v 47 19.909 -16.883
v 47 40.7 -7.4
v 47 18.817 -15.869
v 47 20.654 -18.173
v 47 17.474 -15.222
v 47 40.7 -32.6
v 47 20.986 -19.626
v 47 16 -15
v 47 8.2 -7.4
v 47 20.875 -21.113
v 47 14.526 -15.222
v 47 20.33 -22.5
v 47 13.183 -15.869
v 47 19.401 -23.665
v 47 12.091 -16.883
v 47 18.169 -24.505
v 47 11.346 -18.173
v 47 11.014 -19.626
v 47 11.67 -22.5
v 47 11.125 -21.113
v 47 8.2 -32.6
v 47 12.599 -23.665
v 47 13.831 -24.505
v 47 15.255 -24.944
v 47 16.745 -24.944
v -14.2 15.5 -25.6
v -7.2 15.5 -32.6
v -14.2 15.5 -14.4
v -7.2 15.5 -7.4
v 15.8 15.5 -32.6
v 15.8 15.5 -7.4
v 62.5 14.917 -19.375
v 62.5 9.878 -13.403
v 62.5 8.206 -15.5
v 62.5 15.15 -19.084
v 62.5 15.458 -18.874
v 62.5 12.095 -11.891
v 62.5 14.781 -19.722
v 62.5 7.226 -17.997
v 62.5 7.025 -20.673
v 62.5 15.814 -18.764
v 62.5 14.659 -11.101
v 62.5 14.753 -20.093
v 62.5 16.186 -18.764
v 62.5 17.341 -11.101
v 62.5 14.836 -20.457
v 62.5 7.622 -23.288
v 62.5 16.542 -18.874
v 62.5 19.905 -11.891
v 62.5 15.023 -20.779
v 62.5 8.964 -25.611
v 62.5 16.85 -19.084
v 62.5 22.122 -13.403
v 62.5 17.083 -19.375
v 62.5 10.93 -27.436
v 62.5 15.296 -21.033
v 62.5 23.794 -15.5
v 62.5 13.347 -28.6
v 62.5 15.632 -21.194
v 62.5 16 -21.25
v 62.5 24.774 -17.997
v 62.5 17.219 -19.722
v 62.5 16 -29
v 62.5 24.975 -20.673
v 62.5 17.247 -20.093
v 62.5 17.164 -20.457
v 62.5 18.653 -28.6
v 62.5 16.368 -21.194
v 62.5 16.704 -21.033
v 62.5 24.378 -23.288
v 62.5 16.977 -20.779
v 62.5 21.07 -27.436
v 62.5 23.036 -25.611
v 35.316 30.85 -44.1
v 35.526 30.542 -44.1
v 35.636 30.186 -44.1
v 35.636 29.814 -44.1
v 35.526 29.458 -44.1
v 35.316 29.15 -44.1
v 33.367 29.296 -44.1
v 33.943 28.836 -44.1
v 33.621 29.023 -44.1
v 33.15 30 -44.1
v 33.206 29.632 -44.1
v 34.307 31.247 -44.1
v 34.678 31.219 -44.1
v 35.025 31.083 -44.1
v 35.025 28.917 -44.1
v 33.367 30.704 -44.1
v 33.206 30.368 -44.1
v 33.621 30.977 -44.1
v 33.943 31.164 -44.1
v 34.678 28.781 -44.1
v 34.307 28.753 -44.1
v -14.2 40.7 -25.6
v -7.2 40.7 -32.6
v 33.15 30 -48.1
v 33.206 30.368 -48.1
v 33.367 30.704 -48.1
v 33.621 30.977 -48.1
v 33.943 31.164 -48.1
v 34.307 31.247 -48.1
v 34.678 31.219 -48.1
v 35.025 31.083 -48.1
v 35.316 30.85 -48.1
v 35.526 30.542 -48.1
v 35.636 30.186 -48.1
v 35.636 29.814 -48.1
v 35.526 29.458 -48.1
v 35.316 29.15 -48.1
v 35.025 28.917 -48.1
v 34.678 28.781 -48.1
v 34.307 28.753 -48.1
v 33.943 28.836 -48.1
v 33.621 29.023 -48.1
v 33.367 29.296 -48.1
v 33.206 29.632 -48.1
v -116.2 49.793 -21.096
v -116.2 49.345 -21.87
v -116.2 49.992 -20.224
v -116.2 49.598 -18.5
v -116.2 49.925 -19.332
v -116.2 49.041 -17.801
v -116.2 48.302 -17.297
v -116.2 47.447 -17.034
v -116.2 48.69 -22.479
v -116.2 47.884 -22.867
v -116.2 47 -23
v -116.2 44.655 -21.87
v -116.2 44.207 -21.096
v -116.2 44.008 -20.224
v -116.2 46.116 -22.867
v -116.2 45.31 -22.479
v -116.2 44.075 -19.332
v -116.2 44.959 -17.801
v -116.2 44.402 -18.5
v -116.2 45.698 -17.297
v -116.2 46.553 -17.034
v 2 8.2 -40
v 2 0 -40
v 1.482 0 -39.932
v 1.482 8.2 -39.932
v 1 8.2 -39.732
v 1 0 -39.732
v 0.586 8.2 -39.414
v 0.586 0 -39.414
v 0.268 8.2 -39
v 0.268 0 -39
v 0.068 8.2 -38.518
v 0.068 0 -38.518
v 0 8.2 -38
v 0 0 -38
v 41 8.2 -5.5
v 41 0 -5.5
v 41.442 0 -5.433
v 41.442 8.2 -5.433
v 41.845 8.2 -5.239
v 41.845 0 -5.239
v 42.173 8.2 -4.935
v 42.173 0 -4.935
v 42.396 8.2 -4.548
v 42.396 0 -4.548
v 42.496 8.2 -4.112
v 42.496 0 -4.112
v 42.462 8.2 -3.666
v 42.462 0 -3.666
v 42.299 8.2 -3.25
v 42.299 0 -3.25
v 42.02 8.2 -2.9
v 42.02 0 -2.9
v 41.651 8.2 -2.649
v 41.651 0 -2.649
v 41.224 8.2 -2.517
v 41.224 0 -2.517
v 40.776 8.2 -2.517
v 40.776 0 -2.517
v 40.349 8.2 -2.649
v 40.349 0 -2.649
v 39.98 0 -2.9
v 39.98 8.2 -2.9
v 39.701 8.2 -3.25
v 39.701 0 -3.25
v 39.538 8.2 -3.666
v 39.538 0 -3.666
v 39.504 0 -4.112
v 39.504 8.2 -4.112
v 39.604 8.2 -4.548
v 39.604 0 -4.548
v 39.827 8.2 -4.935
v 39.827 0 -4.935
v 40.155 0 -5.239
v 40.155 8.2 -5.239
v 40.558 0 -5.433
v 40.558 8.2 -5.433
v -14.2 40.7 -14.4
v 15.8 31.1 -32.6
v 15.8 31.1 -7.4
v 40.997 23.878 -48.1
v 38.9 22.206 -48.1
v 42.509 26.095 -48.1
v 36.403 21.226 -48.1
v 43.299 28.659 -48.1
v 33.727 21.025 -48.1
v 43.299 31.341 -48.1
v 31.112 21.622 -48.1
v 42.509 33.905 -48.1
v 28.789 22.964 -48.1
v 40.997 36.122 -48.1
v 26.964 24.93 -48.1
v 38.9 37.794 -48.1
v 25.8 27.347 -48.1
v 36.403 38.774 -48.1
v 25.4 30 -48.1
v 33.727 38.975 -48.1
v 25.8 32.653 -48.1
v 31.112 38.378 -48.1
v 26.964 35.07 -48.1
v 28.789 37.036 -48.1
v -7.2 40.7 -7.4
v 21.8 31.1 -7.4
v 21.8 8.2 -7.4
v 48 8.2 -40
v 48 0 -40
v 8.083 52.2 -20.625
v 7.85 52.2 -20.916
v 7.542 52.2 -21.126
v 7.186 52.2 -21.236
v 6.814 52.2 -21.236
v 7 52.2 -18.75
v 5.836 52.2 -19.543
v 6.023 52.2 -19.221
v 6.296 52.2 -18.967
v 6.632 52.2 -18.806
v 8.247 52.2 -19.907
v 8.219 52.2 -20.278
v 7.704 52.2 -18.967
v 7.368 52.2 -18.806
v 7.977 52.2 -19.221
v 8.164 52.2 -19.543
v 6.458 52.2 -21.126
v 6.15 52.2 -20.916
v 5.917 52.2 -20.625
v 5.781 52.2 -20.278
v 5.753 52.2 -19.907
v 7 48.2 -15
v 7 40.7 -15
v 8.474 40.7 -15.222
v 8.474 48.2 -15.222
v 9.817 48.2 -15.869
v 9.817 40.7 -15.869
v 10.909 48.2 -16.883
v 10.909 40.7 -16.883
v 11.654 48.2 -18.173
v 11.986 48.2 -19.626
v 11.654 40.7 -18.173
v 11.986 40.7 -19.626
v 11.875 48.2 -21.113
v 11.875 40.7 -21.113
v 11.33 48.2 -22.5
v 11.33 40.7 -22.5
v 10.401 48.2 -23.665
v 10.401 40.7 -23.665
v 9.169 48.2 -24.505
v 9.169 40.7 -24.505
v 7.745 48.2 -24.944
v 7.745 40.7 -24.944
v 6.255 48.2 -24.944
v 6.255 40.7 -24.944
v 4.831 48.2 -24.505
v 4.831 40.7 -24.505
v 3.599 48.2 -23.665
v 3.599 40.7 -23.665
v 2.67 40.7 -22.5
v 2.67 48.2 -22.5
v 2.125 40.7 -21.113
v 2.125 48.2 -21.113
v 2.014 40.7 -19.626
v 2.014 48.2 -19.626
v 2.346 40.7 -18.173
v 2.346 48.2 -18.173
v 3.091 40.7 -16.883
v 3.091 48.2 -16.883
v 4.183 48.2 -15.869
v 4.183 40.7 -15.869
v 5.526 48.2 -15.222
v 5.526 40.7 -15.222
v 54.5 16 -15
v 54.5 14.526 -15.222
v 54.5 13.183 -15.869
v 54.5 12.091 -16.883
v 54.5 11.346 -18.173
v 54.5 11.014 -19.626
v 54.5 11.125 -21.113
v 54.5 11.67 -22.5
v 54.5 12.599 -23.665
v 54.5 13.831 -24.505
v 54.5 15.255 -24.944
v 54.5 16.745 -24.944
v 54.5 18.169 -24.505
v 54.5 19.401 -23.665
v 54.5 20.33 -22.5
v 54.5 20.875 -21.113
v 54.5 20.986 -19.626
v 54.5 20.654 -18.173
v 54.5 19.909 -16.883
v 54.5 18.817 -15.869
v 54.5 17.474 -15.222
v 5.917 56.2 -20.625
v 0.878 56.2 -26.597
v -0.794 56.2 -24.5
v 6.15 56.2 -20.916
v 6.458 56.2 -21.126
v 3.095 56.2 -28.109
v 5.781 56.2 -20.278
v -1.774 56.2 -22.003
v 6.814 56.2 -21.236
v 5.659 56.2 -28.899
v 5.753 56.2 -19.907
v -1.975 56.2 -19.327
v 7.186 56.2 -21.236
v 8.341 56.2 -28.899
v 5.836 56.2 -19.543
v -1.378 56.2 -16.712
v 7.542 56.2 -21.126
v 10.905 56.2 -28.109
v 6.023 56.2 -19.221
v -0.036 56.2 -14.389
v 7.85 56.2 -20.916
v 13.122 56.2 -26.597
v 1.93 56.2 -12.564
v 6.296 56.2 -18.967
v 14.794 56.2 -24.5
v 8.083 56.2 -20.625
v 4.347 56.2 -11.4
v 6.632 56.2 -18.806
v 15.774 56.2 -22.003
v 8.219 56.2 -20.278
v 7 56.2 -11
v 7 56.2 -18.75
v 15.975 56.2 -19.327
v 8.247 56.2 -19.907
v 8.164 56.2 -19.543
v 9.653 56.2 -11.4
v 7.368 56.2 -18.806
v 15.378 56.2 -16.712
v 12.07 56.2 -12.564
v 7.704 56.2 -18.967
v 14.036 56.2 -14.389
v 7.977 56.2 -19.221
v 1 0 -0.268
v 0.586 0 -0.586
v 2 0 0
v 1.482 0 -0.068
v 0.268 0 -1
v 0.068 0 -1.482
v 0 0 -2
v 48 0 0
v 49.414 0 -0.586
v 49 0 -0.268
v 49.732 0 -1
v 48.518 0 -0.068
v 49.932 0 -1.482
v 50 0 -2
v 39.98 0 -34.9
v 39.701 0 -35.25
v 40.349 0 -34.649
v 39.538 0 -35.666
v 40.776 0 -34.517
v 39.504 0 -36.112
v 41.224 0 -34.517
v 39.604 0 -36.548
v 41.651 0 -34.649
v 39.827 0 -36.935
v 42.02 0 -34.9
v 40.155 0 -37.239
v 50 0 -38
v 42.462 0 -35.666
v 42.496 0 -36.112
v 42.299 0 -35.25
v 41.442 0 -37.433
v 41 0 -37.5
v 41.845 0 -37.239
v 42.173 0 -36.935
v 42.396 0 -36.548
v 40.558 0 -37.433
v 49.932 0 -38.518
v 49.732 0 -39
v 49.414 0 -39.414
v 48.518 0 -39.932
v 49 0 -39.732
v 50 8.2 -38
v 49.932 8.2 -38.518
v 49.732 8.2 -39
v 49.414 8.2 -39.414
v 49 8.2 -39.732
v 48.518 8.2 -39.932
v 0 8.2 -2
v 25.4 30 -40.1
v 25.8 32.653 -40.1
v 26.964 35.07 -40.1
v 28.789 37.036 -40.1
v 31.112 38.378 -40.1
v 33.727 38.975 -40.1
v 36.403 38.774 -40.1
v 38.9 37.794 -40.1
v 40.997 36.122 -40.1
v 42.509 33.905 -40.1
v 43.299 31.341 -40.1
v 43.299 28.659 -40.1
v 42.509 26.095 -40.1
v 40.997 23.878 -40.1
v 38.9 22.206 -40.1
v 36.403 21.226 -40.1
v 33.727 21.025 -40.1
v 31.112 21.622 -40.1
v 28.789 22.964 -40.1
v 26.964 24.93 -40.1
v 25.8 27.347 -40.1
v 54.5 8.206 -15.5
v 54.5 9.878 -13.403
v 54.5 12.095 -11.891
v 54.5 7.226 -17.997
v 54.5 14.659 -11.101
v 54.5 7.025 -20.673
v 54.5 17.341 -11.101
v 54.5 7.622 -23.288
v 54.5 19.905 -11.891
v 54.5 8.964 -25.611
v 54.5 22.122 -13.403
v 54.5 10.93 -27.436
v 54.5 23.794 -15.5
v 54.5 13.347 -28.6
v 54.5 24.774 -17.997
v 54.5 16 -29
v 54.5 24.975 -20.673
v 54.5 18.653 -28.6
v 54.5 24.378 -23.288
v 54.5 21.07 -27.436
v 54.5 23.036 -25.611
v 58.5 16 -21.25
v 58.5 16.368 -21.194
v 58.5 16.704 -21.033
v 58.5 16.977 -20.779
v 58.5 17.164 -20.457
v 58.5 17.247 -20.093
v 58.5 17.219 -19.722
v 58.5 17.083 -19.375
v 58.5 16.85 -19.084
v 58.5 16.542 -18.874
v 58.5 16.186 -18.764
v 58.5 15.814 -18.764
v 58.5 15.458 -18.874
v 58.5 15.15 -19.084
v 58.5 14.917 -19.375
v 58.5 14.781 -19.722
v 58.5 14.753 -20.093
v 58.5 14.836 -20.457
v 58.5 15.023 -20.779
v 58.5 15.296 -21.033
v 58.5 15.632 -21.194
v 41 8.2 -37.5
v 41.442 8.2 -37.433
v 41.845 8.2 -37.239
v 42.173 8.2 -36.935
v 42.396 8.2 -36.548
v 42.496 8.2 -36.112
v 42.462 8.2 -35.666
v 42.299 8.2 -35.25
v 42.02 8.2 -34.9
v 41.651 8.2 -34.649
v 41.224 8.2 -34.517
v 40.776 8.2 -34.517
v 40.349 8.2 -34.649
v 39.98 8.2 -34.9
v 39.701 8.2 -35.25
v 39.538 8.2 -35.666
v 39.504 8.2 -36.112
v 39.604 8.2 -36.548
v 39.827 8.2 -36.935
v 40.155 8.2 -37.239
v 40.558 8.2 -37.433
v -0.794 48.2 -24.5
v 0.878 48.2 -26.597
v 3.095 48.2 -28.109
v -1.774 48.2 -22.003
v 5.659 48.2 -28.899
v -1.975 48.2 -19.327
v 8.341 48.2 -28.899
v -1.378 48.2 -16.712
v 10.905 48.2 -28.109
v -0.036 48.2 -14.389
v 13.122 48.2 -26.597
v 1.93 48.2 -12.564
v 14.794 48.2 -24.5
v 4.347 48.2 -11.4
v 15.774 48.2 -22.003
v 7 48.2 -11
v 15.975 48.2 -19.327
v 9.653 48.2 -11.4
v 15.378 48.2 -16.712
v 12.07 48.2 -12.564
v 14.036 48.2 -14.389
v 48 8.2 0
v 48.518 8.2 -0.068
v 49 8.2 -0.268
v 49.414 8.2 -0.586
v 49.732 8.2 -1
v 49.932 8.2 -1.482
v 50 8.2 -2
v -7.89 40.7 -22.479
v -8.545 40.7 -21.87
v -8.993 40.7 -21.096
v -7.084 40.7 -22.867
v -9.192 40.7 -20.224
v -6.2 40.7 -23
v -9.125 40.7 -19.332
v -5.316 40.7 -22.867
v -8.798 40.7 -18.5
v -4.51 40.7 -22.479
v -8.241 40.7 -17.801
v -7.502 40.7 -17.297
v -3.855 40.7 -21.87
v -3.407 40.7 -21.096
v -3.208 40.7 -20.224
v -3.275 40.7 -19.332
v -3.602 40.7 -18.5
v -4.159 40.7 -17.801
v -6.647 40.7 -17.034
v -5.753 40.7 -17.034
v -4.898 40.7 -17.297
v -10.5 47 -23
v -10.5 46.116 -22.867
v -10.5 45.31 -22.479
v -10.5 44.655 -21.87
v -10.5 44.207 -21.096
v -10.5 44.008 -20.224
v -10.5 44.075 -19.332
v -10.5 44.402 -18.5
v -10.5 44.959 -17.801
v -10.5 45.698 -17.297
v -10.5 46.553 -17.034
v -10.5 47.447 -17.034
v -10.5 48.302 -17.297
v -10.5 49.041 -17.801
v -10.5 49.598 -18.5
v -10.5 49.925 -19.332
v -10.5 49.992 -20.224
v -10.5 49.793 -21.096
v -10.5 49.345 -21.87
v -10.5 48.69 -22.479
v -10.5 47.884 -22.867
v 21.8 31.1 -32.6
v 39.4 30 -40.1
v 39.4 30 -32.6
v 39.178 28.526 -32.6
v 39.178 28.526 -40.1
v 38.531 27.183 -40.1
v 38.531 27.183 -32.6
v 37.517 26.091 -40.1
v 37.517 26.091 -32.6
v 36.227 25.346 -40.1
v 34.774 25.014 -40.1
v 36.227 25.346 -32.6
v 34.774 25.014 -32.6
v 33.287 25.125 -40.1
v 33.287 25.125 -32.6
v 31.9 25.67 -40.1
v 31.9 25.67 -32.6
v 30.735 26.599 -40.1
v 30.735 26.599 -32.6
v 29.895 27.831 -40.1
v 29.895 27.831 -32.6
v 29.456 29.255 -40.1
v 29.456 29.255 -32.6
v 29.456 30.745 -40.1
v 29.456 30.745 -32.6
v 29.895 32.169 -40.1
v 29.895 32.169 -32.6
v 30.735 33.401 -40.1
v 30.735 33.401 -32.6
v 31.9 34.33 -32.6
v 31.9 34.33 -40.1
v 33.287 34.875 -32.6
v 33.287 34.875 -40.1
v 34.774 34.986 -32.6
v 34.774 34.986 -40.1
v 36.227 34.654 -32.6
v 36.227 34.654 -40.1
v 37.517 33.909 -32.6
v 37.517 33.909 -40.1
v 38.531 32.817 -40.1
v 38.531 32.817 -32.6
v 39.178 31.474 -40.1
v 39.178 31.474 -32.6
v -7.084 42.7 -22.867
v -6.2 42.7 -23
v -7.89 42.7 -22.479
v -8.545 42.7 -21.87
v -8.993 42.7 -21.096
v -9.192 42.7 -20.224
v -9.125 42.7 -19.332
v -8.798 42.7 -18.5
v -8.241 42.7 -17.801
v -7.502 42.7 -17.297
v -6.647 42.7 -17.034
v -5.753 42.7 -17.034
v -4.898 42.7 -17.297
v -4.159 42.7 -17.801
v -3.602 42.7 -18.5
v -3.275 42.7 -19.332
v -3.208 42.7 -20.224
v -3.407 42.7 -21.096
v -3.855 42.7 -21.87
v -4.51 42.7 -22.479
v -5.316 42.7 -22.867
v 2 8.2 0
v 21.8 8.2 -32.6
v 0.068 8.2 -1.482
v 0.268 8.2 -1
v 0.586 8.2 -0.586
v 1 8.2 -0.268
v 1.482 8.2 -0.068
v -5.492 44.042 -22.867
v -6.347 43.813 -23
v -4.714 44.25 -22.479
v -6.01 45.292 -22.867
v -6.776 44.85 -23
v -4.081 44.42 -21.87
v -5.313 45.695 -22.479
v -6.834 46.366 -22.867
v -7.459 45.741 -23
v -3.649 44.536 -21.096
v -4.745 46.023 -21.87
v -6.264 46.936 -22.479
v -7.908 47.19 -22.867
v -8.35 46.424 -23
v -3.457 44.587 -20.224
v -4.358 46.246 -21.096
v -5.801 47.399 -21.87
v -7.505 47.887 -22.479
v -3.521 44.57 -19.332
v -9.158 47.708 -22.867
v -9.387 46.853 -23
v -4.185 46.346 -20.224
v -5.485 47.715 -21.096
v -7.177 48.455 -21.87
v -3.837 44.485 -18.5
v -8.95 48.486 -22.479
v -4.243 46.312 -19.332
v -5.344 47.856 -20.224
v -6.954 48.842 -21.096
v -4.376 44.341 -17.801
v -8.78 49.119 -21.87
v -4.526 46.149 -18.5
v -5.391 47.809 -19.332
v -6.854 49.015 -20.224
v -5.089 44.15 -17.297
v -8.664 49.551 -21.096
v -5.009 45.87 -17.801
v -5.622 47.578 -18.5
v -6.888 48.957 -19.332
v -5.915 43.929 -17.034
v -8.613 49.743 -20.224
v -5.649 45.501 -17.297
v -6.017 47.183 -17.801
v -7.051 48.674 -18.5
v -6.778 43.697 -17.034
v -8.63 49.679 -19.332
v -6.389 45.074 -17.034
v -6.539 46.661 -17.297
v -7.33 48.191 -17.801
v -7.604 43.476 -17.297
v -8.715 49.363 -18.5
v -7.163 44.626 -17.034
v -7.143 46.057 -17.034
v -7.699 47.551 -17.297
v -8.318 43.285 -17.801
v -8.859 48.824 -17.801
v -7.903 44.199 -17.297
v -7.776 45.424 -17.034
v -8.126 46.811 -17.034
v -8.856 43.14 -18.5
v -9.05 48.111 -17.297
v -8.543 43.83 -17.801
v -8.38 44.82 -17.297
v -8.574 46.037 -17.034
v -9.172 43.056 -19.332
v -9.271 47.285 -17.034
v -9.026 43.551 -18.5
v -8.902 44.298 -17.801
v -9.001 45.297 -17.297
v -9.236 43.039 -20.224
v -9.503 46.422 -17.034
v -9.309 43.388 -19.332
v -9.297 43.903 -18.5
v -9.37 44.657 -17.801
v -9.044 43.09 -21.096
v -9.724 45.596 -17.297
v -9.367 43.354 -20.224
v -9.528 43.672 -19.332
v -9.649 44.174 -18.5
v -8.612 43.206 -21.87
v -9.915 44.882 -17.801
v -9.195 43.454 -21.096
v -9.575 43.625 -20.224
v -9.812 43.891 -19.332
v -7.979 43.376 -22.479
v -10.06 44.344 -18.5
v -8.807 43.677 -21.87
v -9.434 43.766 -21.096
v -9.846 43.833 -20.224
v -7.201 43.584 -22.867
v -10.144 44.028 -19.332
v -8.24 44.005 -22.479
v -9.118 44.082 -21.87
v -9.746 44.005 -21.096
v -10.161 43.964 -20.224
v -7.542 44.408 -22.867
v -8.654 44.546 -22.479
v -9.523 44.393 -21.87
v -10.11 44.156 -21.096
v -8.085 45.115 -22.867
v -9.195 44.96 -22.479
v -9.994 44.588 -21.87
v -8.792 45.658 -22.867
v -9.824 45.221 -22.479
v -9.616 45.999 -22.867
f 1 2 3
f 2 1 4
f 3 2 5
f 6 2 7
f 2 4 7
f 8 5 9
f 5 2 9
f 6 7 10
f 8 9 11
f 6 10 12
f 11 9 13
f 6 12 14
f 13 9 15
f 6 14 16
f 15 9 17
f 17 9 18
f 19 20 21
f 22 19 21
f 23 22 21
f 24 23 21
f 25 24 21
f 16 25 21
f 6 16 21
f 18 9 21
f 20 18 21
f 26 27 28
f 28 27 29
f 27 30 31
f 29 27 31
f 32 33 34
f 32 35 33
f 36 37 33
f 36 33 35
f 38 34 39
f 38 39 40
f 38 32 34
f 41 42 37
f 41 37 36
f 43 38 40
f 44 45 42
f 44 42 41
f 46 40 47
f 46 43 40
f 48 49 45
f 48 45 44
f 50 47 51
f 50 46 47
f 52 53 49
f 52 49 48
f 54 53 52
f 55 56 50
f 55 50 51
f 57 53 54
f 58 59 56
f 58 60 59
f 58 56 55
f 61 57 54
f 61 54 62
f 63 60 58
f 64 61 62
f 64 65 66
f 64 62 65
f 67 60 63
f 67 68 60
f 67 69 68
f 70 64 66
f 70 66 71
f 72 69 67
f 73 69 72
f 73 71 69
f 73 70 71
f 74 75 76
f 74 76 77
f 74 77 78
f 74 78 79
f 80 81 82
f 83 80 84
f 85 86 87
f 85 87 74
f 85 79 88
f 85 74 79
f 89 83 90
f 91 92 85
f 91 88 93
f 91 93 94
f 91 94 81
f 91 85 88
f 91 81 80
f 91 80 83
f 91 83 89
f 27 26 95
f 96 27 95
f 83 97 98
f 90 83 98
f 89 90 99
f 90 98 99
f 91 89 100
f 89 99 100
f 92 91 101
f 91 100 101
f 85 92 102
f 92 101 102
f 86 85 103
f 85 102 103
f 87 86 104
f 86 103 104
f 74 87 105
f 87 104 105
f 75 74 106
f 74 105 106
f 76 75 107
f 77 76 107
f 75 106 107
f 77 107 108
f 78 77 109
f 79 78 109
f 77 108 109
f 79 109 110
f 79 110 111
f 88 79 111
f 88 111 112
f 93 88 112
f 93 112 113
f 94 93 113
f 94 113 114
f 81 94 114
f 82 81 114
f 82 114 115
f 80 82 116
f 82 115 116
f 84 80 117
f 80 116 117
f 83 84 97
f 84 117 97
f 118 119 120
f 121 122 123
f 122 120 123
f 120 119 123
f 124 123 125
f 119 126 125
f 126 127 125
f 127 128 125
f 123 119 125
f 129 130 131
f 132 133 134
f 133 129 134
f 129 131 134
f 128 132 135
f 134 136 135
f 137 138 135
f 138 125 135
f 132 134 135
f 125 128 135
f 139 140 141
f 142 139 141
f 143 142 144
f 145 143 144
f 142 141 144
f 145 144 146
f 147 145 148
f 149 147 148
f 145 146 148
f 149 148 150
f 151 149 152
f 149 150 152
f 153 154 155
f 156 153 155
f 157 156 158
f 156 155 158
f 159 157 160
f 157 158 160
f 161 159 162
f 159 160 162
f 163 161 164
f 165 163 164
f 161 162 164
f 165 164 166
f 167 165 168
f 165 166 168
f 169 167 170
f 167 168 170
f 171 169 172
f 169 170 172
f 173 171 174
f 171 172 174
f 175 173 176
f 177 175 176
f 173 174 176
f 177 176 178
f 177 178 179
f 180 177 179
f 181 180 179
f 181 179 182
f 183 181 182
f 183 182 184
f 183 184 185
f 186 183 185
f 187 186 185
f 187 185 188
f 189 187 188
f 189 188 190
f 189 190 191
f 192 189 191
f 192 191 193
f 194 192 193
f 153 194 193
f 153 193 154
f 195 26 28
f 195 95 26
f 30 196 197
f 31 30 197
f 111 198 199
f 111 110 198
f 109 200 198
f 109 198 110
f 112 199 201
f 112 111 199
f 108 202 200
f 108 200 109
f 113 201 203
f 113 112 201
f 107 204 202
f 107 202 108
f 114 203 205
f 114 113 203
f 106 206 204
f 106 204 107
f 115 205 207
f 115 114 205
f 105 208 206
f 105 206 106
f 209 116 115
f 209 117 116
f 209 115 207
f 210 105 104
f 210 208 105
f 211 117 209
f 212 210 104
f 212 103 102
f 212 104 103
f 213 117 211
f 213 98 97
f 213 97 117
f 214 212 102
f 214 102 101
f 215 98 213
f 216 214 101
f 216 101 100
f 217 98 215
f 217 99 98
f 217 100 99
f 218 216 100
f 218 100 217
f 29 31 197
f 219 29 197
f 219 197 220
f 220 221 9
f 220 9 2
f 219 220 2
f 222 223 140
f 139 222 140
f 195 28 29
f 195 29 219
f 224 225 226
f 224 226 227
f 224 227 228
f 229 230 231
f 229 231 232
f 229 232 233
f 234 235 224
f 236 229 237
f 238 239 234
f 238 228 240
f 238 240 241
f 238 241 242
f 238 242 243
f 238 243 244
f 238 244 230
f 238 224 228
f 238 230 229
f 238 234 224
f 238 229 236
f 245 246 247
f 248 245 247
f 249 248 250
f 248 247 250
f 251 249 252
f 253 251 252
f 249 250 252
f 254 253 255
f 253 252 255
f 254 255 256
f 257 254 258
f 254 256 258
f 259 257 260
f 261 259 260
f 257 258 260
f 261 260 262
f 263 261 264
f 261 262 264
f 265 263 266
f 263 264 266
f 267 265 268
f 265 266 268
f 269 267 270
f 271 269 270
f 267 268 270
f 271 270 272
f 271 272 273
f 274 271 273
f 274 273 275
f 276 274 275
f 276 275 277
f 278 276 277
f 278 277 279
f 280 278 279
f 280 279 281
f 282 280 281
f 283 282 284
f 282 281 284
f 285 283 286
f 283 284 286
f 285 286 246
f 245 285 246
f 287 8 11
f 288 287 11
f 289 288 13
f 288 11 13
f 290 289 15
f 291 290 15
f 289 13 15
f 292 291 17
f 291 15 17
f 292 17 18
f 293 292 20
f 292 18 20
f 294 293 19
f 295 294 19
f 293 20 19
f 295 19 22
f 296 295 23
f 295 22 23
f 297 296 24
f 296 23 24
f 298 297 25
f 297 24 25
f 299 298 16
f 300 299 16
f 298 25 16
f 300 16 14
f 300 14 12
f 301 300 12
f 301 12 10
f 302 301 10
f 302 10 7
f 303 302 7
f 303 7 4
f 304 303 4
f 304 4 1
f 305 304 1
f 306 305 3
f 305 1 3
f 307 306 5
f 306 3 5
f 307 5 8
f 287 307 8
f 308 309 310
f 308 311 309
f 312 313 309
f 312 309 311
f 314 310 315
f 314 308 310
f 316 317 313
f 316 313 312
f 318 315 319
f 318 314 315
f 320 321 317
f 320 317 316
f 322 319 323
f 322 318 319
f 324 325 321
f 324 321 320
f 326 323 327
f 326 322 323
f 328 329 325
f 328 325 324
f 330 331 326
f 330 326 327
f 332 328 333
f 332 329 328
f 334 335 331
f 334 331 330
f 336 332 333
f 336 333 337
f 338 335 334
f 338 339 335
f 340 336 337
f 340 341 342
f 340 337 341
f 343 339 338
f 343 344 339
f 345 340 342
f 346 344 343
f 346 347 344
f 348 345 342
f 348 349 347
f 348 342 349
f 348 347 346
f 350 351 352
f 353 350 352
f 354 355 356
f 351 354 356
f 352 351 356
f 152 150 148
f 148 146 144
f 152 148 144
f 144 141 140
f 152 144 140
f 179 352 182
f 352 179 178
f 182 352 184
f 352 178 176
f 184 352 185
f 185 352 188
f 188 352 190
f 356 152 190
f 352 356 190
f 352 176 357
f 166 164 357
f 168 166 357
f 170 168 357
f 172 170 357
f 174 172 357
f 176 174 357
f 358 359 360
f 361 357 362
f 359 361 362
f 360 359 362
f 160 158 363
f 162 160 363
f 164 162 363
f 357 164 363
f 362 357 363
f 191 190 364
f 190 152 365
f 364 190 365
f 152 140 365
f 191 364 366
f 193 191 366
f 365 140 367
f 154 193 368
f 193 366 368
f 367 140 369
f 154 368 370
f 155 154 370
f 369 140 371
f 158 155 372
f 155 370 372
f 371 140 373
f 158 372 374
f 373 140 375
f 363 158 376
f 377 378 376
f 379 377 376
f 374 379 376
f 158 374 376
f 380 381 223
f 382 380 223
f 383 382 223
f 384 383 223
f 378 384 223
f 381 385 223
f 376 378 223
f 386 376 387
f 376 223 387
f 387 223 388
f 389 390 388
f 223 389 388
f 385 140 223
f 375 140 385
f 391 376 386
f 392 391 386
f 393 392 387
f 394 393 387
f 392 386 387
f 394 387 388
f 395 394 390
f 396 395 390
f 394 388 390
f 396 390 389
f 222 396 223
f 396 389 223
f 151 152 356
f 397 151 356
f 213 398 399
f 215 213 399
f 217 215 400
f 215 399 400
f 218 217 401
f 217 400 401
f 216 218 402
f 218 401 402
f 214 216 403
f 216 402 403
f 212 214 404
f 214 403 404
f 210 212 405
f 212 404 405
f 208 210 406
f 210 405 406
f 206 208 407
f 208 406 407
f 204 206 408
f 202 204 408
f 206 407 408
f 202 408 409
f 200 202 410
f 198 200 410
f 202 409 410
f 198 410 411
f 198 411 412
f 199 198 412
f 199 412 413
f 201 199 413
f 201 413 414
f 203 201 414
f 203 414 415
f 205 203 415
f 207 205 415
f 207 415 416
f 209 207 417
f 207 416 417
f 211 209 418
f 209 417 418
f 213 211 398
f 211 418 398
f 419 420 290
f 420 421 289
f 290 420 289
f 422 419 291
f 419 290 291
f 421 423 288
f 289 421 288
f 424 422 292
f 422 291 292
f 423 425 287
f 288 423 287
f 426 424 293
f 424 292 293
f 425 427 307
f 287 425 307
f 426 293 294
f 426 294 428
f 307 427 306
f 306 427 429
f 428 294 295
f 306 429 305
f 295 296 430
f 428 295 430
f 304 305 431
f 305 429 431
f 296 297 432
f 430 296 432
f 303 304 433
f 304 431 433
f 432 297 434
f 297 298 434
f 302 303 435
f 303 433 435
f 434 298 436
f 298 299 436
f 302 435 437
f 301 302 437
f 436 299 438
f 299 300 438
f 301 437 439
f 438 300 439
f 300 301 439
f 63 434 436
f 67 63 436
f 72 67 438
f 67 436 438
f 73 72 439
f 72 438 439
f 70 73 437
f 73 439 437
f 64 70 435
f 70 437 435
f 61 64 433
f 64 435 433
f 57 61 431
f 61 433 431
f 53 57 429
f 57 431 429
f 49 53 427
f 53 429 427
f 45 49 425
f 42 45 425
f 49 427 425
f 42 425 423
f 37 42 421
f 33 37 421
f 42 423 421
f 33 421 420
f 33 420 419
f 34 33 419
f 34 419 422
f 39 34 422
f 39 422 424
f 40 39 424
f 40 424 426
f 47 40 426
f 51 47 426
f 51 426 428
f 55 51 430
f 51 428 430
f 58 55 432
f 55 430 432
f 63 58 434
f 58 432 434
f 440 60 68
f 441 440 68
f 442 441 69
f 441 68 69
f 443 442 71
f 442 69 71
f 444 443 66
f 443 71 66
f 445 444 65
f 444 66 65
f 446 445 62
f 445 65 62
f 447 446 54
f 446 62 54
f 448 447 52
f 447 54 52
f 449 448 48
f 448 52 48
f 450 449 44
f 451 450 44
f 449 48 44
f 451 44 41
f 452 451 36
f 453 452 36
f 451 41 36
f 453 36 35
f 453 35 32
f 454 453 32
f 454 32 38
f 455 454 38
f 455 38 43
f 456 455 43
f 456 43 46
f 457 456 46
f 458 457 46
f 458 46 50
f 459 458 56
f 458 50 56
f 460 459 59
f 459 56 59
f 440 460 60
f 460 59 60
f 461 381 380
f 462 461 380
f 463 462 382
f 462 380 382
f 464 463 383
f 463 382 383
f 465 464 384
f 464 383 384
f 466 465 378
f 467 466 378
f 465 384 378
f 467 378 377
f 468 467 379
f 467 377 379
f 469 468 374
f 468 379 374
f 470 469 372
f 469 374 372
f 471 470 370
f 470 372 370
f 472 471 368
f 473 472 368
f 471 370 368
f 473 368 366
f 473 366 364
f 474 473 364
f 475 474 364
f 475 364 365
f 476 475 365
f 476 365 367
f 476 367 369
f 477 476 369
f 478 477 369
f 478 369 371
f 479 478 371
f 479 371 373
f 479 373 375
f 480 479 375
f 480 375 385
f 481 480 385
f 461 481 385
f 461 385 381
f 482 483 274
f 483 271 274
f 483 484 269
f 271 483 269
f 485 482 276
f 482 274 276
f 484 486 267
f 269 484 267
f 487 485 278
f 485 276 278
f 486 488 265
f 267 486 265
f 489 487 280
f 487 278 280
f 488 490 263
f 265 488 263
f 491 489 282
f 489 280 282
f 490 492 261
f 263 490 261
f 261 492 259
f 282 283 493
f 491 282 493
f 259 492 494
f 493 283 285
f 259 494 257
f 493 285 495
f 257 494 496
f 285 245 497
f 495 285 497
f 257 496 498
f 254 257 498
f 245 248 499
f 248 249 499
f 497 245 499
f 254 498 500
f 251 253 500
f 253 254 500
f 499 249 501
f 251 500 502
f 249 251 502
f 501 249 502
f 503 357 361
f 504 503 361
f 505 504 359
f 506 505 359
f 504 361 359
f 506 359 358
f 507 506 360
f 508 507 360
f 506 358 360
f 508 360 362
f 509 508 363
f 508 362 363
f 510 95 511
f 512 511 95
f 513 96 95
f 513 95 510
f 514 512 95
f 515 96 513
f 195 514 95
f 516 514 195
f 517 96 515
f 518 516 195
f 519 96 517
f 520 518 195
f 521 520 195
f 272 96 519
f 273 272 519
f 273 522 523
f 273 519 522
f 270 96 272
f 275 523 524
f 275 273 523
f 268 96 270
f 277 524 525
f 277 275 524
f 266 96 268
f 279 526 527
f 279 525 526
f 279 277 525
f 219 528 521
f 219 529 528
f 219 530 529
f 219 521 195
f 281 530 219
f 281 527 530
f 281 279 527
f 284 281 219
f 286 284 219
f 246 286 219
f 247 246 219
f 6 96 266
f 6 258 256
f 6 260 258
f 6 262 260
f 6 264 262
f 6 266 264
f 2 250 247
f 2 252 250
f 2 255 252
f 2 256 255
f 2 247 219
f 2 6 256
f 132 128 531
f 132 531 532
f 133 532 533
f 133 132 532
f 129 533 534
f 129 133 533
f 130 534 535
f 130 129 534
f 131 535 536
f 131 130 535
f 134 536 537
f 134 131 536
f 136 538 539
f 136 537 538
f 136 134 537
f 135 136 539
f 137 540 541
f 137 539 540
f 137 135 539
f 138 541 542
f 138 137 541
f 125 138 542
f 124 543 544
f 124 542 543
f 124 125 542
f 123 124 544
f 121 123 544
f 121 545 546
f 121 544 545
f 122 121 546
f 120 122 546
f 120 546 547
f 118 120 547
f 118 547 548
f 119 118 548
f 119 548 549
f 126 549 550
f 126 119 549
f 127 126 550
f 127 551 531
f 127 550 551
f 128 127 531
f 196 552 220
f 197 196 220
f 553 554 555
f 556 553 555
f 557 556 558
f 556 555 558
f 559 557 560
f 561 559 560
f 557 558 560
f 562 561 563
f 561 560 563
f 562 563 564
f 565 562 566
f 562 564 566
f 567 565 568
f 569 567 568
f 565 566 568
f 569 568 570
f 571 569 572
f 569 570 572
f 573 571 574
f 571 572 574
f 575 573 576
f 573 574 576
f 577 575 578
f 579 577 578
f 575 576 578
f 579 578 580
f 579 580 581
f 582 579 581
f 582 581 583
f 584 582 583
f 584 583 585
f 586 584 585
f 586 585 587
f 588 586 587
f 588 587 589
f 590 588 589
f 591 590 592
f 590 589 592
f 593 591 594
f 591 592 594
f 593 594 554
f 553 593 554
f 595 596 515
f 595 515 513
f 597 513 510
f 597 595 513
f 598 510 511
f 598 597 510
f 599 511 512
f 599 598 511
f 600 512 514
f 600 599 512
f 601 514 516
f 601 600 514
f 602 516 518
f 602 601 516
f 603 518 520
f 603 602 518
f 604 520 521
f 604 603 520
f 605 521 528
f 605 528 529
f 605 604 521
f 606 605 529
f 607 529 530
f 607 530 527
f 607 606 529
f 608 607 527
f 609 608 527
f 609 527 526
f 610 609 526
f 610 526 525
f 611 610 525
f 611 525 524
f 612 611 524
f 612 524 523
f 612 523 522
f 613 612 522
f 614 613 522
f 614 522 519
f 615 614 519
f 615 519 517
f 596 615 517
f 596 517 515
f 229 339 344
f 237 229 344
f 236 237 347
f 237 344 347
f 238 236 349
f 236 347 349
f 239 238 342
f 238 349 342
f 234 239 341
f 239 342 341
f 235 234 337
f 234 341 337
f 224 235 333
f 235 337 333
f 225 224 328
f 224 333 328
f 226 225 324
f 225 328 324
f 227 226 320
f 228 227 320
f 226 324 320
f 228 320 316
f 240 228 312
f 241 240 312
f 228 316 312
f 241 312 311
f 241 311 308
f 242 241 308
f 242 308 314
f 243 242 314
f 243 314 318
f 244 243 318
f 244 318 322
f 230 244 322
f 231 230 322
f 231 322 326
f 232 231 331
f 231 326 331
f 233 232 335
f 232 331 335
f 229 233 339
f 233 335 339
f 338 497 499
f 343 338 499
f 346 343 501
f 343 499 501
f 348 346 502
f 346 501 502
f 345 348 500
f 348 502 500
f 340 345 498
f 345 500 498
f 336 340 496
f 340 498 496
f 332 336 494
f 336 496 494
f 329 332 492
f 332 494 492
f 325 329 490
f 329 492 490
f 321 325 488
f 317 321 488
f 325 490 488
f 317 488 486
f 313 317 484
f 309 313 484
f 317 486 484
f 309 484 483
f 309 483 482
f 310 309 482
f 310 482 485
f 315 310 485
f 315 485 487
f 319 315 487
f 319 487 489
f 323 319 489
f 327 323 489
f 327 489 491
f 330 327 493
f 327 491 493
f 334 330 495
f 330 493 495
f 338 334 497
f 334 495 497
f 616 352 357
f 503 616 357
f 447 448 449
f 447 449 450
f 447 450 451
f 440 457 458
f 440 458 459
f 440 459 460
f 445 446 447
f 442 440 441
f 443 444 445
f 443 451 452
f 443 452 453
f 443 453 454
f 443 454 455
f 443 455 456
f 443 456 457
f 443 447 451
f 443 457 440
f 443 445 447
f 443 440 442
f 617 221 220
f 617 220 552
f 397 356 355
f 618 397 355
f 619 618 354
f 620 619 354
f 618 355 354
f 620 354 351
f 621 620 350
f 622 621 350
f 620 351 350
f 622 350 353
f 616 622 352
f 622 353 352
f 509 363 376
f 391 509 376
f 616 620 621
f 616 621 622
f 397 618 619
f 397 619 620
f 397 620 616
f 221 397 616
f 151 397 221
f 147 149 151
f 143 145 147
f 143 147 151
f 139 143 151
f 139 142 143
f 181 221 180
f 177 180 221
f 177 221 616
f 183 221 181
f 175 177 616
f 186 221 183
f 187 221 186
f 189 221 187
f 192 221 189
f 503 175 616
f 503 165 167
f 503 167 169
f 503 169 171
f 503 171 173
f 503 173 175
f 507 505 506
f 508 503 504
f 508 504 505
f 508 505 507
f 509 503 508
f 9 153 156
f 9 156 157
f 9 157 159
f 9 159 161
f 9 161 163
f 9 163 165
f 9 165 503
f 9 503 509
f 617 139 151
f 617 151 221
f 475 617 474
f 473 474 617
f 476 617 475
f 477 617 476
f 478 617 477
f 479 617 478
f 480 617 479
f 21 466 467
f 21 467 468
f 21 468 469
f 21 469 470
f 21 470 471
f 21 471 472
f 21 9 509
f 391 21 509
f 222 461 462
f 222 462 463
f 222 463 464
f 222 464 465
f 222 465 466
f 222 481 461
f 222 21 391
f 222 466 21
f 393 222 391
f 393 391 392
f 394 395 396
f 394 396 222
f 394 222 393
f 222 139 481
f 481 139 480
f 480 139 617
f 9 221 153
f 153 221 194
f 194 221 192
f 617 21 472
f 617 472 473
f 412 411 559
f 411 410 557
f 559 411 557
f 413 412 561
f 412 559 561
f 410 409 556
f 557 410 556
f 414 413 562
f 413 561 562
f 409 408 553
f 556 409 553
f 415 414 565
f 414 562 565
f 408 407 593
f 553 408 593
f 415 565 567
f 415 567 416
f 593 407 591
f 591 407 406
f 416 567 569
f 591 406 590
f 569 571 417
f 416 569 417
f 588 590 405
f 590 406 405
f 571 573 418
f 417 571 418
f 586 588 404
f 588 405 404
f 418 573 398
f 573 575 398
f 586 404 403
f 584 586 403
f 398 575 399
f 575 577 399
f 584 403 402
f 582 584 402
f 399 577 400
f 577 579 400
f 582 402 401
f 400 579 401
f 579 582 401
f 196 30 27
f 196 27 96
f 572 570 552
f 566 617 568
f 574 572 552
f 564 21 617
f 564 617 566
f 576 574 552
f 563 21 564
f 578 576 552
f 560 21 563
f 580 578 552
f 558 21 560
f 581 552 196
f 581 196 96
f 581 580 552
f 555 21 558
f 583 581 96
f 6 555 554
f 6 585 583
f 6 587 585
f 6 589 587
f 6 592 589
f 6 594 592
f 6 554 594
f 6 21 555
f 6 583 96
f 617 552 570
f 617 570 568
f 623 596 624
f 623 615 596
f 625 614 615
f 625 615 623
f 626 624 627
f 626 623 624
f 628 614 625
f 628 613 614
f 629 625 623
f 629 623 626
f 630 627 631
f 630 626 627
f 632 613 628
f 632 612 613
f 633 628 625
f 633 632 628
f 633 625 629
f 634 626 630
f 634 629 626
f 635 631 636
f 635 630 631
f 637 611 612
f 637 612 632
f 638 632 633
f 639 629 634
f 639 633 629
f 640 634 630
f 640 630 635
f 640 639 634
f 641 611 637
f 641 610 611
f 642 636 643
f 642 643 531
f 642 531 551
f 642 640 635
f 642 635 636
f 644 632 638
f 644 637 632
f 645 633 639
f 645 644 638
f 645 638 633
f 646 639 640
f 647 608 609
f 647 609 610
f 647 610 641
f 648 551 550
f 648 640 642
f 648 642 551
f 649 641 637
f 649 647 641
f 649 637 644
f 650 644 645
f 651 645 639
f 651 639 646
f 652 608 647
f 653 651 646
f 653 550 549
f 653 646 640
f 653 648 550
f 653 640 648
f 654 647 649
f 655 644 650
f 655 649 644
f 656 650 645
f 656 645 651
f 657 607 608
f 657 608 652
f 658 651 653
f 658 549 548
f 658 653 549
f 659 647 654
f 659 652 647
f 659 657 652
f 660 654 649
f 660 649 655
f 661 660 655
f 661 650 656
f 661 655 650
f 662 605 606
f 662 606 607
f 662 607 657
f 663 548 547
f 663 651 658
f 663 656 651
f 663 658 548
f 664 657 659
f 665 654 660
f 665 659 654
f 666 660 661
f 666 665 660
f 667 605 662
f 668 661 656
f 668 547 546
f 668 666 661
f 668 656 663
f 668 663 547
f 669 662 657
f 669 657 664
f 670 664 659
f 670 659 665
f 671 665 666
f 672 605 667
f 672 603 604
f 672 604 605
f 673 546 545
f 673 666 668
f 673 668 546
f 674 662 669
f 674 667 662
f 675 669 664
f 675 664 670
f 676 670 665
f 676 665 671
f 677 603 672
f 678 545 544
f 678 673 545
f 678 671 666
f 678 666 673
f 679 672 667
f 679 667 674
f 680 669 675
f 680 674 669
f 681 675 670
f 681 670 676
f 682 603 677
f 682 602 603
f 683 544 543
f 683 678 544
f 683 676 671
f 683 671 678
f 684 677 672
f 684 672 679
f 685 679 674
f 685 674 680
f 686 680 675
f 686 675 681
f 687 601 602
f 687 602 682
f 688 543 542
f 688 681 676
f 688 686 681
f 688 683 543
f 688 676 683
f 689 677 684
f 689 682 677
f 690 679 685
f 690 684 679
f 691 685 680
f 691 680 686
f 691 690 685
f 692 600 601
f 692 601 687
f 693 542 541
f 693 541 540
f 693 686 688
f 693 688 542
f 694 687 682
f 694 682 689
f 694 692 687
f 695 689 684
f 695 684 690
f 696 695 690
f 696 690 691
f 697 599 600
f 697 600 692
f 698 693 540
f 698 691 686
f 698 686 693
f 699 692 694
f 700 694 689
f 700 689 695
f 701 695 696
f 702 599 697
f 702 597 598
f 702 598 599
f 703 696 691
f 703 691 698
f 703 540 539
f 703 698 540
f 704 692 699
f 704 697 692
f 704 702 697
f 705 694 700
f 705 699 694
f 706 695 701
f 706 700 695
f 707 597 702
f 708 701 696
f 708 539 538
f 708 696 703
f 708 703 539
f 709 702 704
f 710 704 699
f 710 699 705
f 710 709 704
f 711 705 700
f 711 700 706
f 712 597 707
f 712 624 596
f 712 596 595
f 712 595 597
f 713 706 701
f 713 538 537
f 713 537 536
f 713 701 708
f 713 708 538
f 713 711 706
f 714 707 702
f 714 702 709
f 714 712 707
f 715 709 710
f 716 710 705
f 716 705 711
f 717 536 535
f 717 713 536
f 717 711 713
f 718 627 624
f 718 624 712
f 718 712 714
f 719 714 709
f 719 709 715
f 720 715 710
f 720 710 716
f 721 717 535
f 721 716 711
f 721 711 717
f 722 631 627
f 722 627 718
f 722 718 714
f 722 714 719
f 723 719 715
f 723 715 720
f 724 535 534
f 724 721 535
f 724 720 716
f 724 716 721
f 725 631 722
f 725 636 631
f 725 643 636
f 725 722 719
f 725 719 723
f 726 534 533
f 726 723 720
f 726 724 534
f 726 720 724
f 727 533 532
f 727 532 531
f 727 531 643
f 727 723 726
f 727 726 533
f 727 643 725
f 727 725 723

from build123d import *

# Parameters (mm, degrees)
BOSS_EXTRUDE1_DEPTH  = 8.2
SKETCH2_W            = 25.2
SKETCH2_H            = 25.2
BOSS_EXTRUDE2_DEPTH  = 32.5
SKETCH3_W            = 25.2
SKETCH3_H            = 9.6
BOSS_EXTRUDE3_DEPTH  = 6
SKETCH4_W            = 25.2
SKETCH4_H            = 25.2
BOSS_EXTRUDE4_DEPTH  = 30
CHAMFER1_SIZE        = 7
SKETCH5_R            = 5
BOSS_EXTRUDE5_DEPTH  = 7.5
SKETCH6_R            = 9
BOSS_EXTRUDE6_DEPTH  = 8
SKETCH7_R            = 1.25
CUT_EXTRUDE1_DEPTH   = 4
SKETCH8_R            = 5
BOSS_EXTRUDE7_DEPTH  = 7.5
SKETCH9_R            = 9
BOSS_EXTRUDE8_DEPTH  = 8
SKETCH10_R           = 1.25
CUT_EXTRUDE2_DEPTH   = 4
SKETCH11_R           = 5
BOSS_EXTRUDE9_DEPTH  = 7.5
SKETCH12_R           = 9
BOSS_EXTRUDE10_DEPTH = 8
SKETCH13_R           = 1.25
CUT_EXTRUDE3_DEPTH   = 4
SKETCH15_R           = 3
CUT_EXTRUDE4_REACH   = 139.748
SKETCH16_R           = 1.5


with BuildPart() as part:
    # Sketch1 → Boss-Extrude1 (new body)
    with BuildSketch(Plane(origin=(0, 0, 0), x_dir=(1, 0, 0), z_dir=(0, 1, 0))):
        with BuildLine():
            Line((2, 0), (48, 0))
            ThreePointArc((48, 0), (49.414213562, 0.585786438), (50, 2))
            Line((50, 2), (50, 38))
            ThreePointArc((50, 38), (49.414213562, 39.414213562), (48, 40))
            Line((48, 40), (2, 40))
            ThreePointArc((2, 40), (0.585786438, 39.414213562), (0, 38))
            Line((0, 38), (0, 2))
            ThreePointArc((0, 2), (0.585786438, 0.585786438), (2, 0))
        make_face()
    extrude(amount=BOSS_EXTRUDE1_DEPTH)

    # Sketch2 → Boss-Extrude2 (add)
    with BuildSketch(Plane(origin=(0, 8.2, 0), x_dir=(1, 0, 0), z_dir=(0, 1, 0))):
        with Locations((34.4, 20)):
            Rectangle(SKETCH2_W, SKETCH2_H)
    extrude(amount=BOSS_EXTRUDE2_DEPTH)

    # Sketch3 → Boss-Extrude3 (add)
    with BuildSketch(Plane.ZY.offset(-21.8)):
        with Locations((-20, 35.9)):
            Rectangle(SKETCH3_W, SKETCH3_H)
    extrude(amount=BOSS_EXTRUDE3_DEPTH)

    # Sketch4 → Boss-Extrude4 (add)
    with BuildSketch(Plane.ZY.offset(-15.8)):
        with Locations((-20, 28.1)):
            Rectangle(SKETCH4_W, SKETCH4_H)
    extrude(amount=BOSS_EXTRUDE4_DEPTH)

    # Chamfer1
    chamfer1_edges = [part.edges().sort_by_distance(p)[0] for p in [
        (-14.2, 28.1, -32.6),
        (-14.2, 28.1, -7.4),
    ]]
    chamfer(chamfer1_edges, length=CHAMFER1_SIZE)

    # Sketch5 → Boss-Extrude5 (add)
    with BuildSketch(Plane(origin=(47, 0, 0), x_dir=(0, 0, -1), z_dir=(1, 0, 0))):
        with Locations(Location((20, 16, 0), (0, 0, 180))):
            Circle(SKETCH5_R)
    extrude(amount=BOSS_EXTRUDE5_DEPTH)

    # Sketch6 → Boss-Extrude6 (add)
    with BuildSketch(Plane(origin=(54.5, 0, 0), x_dir=(0, 0, -1), z_dir=(1, 0, 0))):
        with Locations((20, 16)):
            Circle(SKETCH6_R)
    extrude(amount=BOSS_EXTRUDE6_DEPTH)

    # Sketch7 → Cut-Extrude1 (cut)
    with BuildSketch(Plane(origin=(62.5, 0, 0), x_dir=(0, 0, -1), z_dir=(1, 0, 0))):
        with Locations((20, 16)):
            Circle(SKETCH7_R)
    extrude(amount=-CUT_EXTRUDE1_DEPTH, mode=Mode.SUBTRACT)

    # Sketch8 → Boss-Extrude7 (add)
    with BuildSketch(Plane(origin=(0, 0, -32.6), x_dir=(-1, 0, 0), z_dir=(0, 0, -1))):
        with Locations(Location((-34.4, 30, 0), (0, 0, 180))):
            Circle(SKETCH8_R)
    extrude(amount=BOSS_EXTRUDE7_DEPTH)

    # Sketch9 → Boss-Extrude8 (add)
    with BuildSketch(Plane(origin=(0, 0, -40.1), x_dir=(-1, 0, 0), z_dir=(0, 0, -1))):
        with Locations((-34.4, 30)):
            Circle(SKETCH9_R)
    extrude(amount=BOSS_EXTRUDE8_DEPTH)

    # Sketch10 → Cut-Extrude2 (cut)
    with BuildSketch(Plane(origin=(0, 0, -48.1), x_dir=(-1, 0, 0), z_dir=(0, 0, -1))):
        with Locations((-34.4, 30)):
            Circle(SKETCH10_R)
    extrude(amount=-CUT_EXTRUDE2_DEPTH, mode=Mode.SUBTRACT)

    # Sketch11 → Boss-Extrude9 (add)
    with BuildSketch(Plane(origin=(0, 40.7, 0), x_dir=(1, 0, 0), z_dir=(0, 1, 0))):
        with Locations(Location((7, 20, 0), (0, 0, 270))):
            Circle(SKETCH11_R)
    extrude(amount=BOSS_EXTRUDE9_DEPTH)

    # Sketch12 → Boss-Extrude10 (add)
    with BuildSketch(Plane(origin=(0, 48.2, 0), x_dir=(1, 0, 0), z_dir=(0, 1, 0))):
        with Locations(Location((7, 20, 0), (0, 0, 270))):
            Circle(SKETCH12_R)
    extrude(amount=BOSS_EXTRUDE10_DEPTH)

    # Sketch13 → Cut-Extrude3 (cut)
    with BuildSketch(Plane(origin=(0, 56.2, 0), x_dir=(1, 0, 0), z_dir=(0, 1, 0))):
        with Locations(Location((7, 20, 0), (0, 0, 270))):
            Circle(SKETCH13_R)
    extrude(amount=-CUT_EXTRUDE3_DEPTH, mode=Mode.SUBTRACT)

    # Sweep1: sweep along a path in Sketch14
    with BuildLine(Plane.XY.offset(-20)) as sweep1_path:
        Line((-6.2, 40.7), (-6.2, 42.7))
        ThreePointArc((-6.2, 42.7), (-7.459440841, 45.740559159), (-10.5, 47))
        Line((-10.5, 47), (-116.2, 47))
    # Sketch15 → Sweep1 (sweep)
    with BuildSketch(Plane(origin=(-116.2, 0, 0), x_dir=(0, 0, -1), z_dir=(1, 0, 0))):
        with Locations((20, 47)):
            Circle(SKETCH15_R)
    sweep(path=sweep1_path.line)

    # Sketch16 → Cut-Extrude4 (cut, up to next)
    with BuildSketch(Plane.XZ, mode=Mode.PRIVATE) as cut_extrude4_sk1:
        with Locations(Location((41, -4, 0), (0, 0, 270))):
            Circle(SKETCH16_R)
    cut_extrude4_tool1 = extrude(cut_extrude4_sk1.sketch, amount=-CUT_EXTRUDE4_REACH, mode=Mode.PRIVATE) & part.part
    # Sketch16 → Cut-Extrude4 (cut, up to next)
    with BuildSketch(Plane.XZ, mode=Mode.PRIVATE) as cut_extrude4_sk2:
        with Locations(Location((41, -36, 0), (0, 0, 270))):
            Circle(SKETCH16_R)
    cut_extrude4_tool2 = extrude(cut_extrude4_sk2.sketch, amount=-CUT_EXTRUDE4_REACH, mode=Mode.PRIVATE) & part.part
    add(cut_extrude4_tool1.solids().sort_by_distance((41, 0, -4))[0], mode=Mode.SUBTRACT)
    add(cut_extrude4_tool2.solids().sort_by_distance((41, 0, -36))[0], mode=Mode.SUBTRACT)


solid = part.part
